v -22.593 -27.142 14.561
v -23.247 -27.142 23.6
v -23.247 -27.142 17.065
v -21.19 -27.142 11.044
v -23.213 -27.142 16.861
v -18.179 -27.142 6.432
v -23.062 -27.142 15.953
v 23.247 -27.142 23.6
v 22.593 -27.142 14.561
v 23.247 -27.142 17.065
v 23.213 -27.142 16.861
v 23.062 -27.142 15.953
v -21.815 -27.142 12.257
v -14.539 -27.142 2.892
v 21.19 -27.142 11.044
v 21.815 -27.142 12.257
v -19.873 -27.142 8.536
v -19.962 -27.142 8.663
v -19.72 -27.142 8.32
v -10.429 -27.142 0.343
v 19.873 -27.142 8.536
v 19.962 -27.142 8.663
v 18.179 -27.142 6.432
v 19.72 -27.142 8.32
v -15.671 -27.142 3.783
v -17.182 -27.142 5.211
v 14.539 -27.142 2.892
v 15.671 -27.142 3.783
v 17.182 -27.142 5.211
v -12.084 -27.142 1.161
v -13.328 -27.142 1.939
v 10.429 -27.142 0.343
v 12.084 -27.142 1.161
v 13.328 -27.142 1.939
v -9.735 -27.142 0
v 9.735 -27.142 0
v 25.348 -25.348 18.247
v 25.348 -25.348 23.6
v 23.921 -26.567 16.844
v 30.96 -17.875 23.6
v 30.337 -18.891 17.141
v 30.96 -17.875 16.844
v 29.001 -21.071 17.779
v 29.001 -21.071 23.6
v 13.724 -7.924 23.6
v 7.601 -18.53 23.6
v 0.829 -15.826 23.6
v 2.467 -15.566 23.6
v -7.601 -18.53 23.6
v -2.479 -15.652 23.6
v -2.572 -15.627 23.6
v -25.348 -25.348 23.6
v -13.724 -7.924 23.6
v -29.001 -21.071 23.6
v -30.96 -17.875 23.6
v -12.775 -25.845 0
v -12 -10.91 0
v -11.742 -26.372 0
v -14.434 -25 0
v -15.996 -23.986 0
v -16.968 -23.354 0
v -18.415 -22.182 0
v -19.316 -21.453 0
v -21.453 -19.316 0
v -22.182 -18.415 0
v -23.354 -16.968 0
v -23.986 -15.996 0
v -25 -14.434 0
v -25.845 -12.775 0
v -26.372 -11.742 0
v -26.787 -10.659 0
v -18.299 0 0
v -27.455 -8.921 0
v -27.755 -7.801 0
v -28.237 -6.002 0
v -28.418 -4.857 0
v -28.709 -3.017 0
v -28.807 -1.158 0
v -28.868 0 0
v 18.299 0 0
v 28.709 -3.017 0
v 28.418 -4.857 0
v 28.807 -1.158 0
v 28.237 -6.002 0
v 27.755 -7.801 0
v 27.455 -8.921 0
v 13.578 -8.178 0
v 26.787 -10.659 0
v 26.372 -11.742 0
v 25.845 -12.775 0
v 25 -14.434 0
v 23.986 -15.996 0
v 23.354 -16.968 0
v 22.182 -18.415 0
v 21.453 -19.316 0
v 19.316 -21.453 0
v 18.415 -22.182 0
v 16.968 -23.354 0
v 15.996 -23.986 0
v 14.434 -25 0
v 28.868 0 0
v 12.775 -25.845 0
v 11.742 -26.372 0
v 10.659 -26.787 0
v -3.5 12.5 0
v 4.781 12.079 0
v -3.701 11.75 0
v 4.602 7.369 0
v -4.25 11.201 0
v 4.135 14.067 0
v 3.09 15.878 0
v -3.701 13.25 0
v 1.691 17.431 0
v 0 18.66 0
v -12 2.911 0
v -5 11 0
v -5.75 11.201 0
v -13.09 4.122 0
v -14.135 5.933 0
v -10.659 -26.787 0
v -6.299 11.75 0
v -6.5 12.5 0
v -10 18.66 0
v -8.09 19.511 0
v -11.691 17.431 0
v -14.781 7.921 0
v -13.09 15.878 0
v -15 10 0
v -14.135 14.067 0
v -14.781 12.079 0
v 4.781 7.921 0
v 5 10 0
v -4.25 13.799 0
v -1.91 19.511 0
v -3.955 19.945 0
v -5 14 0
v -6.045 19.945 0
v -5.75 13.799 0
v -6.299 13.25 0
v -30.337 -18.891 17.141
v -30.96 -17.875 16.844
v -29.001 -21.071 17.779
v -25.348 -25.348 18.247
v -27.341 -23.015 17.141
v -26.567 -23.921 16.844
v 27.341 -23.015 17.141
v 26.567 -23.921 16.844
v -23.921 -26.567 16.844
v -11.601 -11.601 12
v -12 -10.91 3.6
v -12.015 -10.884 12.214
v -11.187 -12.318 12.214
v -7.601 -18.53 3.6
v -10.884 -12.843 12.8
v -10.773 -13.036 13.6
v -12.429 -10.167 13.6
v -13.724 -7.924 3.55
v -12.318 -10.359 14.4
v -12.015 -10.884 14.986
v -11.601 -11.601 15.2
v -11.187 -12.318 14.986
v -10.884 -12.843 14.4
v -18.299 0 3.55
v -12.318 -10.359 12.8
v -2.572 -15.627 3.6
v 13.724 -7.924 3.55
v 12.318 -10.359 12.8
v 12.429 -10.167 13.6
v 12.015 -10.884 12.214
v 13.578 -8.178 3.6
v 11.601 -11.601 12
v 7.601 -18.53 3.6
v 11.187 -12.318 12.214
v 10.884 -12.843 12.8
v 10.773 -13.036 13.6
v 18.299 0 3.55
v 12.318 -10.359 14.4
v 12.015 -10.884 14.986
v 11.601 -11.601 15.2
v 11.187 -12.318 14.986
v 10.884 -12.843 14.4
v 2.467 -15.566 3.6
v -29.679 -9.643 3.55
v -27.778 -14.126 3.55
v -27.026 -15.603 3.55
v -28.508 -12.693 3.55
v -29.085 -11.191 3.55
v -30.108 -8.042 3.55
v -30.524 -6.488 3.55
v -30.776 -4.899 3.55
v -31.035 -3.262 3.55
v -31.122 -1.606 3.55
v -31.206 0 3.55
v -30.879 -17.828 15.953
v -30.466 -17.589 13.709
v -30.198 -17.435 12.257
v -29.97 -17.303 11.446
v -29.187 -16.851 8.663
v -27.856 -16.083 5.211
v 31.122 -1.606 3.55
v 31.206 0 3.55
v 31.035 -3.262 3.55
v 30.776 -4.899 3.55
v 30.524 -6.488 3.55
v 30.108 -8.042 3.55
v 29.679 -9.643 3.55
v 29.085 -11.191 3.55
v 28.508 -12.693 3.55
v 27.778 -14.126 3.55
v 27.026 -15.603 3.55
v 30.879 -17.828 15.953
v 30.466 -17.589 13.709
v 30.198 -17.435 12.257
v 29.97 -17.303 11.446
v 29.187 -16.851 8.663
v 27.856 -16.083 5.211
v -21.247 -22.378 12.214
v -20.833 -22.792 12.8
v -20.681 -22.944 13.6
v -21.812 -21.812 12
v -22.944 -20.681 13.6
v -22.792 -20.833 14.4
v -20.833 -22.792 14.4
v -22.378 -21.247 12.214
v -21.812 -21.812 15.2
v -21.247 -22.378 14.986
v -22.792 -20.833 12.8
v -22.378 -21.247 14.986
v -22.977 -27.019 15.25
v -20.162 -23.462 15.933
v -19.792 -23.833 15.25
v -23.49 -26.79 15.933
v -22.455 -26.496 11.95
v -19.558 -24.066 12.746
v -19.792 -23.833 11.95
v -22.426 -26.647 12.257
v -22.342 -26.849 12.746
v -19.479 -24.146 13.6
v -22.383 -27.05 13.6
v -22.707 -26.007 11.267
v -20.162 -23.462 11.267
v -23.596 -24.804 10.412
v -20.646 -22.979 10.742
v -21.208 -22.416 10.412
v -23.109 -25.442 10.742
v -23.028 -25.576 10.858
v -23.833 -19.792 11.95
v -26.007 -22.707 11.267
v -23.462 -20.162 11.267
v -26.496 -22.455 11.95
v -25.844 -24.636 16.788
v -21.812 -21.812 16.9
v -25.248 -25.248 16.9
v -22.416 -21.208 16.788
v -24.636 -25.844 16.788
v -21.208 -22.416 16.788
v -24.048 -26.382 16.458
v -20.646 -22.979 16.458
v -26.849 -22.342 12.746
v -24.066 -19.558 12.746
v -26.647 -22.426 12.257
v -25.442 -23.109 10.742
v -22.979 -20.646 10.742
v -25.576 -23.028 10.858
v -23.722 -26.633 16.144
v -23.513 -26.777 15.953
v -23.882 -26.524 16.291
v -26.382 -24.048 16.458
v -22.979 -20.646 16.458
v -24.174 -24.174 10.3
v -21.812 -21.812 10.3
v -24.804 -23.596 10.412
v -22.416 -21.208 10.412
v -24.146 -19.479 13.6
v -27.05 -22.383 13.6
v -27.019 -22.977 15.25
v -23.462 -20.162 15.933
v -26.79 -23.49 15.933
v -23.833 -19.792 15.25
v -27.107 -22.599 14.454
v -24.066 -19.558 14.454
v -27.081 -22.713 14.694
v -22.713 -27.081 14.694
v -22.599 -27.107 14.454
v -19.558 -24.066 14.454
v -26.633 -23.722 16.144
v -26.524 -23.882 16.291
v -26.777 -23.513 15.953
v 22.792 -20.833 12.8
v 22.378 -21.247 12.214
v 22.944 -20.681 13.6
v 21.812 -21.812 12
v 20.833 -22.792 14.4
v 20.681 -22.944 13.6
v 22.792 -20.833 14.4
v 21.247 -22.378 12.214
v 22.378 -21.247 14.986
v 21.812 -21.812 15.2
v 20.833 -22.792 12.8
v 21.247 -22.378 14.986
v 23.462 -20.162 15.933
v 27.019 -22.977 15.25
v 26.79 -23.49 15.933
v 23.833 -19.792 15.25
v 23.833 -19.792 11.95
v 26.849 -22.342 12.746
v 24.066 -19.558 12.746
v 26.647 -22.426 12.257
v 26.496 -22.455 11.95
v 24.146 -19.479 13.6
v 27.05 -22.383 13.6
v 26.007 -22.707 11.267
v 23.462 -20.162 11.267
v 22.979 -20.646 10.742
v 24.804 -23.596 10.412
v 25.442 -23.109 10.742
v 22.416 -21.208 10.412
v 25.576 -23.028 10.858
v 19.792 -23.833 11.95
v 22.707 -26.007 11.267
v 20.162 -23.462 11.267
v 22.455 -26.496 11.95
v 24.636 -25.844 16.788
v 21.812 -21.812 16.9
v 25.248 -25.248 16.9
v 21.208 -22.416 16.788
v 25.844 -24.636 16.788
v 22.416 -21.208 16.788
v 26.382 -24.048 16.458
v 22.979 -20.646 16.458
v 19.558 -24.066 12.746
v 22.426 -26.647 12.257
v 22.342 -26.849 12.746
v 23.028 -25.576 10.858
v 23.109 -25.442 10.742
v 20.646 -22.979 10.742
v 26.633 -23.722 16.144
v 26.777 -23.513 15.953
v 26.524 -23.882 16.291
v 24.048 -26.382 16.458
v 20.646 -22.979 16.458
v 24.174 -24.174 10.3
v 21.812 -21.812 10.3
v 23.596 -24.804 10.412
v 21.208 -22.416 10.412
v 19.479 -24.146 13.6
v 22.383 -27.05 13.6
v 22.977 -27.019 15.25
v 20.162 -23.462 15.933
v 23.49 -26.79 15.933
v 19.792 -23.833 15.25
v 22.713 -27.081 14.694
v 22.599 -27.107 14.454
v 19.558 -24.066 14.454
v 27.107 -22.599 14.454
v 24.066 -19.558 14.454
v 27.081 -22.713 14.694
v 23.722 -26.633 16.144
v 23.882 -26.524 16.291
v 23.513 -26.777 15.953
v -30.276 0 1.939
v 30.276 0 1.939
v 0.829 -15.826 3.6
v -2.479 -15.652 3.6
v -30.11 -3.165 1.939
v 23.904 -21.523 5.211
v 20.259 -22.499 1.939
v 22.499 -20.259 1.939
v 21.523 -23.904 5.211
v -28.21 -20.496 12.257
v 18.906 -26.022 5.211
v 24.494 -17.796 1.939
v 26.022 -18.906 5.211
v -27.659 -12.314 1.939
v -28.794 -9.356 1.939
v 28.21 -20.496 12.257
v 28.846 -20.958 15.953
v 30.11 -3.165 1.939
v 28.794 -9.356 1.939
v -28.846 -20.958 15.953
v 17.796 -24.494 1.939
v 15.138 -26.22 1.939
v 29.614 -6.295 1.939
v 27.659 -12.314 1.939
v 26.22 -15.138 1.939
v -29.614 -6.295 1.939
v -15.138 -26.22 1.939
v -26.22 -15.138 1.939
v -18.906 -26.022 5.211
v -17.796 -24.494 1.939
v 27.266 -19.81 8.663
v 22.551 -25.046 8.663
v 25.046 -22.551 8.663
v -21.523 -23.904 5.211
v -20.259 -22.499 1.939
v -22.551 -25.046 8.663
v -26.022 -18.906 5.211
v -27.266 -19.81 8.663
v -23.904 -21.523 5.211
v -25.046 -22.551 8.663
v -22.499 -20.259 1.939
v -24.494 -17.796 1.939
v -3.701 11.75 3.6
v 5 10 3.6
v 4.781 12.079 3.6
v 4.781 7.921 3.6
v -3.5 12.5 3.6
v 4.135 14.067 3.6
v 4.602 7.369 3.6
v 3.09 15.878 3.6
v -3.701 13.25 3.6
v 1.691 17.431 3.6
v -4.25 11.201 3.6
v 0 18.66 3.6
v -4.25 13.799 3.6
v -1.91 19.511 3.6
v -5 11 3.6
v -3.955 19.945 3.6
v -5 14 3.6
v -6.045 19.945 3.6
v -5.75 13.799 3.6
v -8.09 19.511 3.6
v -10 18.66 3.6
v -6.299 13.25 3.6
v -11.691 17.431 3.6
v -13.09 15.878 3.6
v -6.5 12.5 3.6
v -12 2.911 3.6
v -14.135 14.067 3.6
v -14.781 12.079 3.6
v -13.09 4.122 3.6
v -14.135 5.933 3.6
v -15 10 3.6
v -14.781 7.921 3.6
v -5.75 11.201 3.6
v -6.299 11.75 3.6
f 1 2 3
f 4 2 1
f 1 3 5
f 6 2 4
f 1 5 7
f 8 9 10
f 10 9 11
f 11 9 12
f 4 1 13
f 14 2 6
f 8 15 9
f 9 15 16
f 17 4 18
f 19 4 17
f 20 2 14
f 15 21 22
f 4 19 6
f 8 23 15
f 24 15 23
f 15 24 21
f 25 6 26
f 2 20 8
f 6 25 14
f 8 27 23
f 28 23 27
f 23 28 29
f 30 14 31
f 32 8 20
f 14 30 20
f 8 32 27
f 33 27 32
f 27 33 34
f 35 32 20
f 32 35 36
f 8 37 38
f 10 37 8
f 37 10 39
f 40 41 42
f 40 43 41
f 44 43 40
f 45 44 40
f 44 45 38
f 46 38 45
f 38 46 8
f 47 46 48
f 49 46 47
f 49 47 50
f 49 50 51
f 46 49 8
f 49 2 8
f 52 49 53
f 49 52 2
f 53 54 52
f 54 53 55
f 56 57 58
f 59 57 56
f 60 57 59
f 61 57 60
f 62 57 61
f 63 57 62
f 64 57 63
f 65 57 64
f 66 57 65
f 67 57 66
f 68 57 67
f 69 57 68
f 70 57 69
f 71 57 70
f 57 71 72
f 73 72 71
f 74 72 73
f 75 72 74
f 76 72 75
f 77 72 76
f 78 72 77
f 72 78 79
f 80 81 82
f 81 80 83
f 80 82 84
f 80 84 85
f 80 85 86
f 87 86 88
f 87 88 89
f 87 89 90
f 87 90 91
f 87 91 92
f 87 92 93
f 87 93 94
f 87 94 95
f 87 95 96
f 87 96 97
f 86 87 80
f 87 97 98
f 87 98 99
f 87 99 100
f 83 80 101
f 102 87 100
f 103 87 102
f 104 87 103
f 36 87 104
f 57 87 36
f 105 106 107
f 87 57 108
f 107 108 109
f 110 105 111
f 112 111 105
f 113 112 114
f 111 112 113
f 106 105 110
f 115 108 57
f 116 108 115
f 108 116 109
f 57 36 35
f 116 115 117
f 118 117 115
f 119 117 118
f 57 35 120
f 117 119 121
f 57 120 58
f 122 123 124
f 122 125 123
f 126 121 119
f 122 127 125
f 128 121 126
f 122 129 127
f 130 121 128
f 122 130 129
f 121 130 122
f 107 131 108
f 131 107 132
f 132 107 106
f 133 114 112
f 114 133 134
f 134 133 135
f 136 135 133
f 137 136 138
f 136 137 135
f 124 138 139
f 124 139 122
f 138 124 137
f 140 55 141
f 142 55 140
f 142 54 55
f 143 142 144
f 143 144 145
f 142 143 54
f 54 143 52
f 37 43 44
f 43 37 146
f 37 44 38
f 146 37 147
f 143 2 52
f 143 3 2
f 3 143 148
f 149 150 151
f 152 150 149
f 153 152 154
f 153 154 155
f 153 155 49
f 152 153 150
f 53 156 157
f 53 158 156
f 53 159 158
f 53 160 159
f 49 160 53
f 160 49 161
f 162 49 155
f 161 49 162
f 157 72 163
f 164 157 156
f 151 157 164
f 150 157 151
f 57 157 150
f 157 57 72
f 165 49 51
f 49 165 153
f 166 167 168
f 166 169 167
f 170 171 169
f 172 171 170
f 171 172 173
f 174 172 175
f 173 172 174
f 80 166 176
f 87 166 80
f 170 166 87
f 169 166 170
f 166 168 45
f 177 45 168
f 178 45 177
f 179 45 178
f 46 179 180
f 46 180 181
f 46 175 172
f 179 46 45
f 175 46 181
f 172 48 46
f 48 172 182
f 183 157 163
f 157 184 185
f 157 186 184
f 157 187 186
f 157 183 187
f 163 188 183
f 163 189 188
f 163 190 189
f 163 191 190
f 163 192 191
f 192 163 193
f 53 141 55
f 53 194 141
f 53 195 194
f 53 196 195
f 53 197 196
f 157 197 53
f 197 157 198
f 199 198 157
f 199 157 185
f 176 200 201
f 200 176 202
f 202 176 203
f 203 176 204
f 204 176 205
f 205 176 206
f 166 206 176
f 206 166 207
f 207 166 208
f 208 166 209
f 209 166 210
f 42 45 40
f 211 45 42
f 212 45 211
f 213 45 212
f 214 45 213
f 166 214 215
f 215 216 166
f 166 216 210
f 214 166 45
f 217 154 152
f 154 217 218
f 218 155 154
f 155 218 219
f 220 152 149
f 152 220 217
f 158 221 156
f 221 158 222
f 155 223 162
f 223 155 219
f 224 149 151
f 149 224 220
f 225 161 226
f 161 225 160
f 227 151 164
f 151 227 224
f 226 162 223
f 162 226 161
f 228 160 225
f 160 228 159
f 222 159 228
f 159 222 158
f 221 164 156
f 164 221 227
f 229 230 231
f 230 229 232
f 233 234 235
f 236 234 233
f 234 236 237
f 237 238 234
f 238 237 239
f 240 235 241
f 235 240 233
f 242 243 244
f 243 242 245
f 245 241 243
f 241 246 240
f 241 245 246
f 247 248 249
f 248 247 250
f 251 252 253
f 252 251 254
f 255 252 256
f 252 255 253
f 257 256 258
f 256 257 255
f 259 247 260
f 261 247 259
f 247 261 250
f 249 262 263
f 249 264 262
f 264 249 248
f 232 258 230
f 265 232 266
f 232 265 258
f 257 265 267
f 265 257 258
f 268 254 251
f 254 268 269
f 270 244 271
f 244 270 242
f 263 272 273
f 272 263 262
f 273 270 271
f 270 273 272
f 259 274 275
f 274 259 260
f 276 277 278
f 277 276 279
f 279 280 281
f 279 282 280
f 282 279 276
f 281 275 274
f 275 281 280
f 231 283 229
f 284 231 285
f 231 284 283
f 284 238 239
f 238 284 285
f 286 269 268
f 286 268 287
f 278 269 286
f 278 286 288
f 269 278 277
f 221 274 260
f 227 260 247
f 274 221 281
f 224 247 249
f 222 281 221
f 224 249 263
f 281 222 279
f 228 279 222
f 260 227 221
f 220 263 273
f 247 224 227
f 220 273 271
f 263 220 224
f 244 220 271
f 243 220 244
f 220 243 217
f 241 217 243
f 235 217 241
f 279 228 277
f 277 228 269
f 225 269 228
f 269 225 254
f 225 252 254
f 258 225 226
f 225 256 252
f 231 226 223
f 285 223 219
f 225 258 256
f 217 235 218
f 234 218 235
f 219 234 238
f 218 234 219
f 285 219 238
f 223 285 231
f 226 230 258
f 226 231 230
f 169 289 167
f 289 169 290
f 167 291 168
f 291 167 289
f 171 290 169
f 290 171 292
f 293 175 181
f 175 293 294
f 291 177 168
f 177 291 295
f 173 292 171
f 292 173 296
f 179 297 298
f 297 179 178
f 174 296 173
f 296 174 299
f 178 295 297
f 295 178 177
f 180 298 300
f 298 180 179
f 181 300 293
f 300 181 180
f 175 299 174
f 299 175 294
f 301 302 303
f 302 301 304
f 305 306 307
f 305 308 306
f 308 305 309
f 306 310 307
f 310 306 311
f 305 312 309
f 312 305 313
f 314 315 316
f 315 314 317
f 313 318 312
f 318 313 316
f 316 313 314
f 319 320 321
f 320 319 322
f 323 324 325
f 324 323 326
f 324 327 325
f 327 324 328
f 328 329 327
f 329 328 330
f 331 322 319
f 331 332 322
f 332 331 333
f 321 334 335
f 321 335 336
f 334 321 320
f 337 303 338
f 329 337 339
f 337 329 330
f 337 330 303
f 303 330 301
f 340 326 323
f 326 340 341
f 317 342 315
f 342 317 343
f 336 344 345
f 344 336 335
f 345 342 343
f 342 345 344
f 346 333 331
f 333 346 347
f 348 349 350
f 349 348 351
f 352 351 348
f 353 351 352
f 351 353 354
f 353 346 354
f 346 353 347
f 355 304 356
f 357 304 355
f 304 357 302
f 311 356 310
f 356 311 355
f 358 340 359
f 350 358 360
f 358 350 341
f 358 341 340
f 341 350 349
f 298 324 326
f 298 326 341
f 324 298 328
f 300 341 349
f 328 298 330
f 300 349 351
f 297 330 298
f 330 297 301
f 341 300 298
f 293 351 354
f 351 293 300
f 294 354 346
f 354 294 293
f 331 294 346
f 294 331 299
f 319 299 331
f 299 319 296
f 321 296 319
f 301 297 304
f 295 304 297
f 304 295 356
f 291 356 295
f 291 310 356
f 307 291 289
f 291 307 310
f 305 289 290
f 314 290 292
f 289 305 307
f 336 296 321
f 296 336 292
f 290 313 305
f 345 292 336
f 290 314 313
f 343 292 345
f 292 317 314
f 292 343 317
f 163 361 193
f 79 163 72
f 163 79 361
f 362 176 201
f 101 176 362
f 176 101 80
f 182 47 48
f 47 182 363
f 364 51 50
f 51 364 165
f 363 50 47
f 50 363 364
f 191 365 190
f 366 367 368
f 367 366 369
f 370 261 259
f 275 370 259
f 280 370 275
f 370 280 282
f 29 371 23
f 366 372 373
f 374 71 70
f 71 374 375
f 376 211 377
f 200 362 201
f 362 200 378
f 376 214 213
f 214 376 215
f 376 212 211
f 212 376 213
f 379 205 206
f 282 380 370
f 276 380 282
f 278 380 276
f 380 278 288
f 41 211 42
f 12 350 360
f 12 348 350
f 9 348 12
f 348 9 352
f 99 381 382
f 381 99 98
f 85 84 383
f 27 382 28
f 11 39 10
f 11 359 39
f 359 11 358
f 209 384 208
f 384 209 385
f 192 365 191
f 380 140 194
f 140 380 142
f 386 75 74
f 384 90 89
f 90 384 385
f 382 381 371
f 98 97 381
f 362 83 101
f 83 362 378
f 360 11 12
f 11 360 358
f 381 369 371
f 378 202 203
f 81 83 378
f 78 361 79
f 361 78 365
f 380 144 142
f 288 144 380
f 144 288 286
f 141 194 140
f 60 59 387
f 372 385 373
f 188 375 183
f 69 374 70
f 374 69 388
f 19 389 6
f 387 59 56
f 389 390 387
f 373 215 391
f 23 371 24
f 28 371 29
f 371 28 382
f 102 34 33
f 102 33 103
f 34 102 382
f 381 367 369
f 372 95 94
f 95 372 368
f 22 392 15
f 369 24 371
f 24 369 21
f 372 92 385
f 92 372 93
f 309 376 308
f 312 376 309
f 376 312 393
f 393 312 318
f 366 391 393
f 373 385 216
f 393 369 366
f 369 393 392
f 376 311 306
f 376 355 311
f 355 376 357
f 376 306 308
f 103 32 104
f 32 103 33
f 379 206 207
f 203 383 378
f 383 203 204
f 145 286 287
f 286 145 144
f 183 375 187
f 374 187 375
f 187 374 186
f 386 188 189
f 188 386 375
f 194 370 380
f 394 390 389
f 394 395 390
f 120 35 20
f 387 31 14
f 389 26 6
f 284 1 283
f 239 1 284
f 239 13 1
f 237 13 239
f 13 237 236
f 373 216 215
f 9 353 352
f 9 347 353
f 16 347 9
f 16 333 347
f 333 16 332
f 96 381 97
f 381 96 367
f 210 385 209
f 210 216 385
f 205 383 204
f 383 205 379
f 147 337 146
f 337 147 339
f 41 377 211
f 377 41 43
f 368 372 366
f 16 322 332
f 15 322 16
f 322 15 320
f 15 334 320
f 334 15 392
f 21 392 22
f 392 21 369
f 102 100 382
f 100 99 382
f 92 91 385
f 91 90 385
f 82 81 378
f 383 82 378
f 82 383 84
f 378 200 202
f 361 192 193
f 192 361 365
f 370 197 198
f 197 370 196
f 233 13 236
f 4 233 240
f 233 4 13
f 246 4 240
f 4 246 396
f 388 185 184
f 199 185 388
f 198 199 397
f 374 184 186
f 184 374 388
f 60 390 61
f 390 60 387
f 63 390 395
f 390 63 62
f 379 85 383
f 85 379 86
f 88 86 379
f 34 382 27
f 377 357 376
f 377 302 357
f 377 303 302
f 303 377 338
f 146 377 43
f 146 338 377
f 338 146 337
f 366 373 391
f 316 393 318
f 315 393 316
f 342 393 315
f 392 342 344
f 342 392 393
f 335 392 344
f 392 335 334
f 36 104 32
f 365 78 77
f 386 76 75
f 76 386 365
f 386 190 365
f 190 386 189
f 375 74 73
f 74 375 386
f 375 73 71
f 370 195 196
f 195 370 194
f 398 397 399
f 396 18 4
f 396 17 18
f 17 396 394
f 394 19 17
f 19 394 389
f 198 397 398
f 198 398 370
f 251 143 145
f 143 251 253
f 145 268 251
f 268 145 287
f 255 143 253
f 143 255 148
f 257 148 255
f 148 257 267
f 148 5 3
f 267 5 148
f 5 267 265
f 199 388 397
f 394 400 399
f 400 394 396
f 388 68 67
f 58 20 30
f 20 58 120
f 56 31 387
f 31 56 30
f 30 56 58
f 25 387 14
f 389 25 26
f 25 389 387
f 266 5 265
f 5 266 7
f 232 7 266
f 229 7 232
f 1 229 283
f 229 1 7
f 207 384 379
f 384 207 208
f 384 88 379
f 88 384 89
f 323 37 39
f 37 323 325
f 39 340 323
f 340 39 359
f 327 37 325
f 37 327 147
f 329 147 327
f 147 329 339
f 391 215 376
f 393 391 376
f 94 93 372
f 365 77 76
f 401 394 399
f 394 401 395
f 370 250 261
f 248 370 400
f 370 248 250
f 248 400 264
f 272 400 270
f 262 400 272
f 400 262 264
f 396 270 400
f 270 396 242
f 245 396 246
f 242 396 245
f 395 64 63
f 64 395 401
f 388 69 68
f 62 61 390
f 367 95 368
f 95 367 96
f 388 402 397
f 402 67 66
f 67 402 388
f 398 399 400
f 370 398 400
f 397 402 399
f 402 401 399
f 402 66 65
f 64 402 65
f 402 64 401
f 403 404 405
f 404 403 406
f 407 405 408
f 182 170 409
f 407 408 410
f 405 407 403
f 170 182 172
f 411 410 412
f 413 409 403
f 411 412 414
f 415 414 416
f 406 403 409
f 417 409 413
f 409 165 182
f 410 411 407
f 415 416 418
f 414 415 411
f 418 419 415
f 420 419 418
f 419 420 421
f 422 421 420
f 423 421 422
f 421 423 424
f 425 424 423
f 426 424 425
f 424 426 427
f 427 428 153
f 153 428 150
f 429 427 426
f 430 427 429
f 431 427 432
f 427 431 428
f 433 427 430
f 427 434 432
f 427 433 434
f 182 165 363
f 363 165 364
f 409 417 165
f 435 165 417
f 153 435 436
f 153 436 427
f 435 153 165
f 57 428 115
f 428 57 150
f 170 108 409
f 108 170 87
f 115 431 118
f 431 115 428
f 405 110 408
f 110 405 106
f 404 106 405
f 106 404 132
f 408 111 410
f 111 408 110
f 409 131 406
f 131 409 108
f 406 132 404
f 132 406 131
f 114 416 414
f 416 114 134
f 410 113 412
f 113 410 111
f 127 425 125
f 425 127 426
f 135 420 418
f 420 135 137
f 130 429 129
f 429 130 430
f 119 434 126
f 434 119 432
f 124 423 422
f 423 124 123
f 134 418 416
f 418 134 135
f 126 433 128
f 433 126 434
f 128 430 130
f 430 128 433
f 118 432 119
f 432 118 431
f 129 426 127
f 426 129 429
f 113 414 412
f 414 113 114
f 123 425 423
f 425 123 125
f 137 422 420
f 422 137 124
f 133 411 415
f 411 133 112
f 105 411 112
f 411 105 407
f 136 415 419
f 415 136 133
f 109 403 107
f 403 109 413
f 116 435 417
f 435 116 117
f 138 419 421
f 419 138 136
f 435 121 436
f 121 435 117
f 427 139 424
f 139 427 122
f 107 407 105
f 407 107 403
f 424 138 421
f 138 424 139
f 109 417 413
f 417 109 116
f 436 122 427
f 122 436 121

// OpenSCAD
// file: libraries/frame_axis_block.scad
// extr=20; h = 3*extr; w = h; diagonal = extr*sqrt(2); thickness=3.6; 
 

module frame_axis_block(h, w, thickness, extr, diagonal) {
  difference() {
    intersection() {
      //rotate([0, 0, -30])
       translate([-extr*sin(15), -extr*cos(15), -h/2], center=false)
	        cube([extr*sin(15)+thickness, w, h]);
      union() {
	      translate([0,-extr*cos(15), -h/2]) 
      //   rotate([0, 0, -30])
	          cube([thickness, w, h]); //main frame plate
	    //  rotate([0, 0, -45])
        translate([-extr*sin(15), -extr*cos(15), -h/2])
          rotate([0,0,-15])
	          cube([extr, extr, h], center=false); //15degr extr cutout
      }
    } 
    
    
      // Vertical OpenBeam mounting screw holes.
       # for (z=[h/2-extr/2, -h/2+extr/2]) {
          translate([0, 0, z]) 
            rotate([90, 0, 75])
              translate([-extr/2, 0, extr/2*sin(15)+5]) {
                 cylinder(r=1.6, h=50, $fn=12, center=true);
                // cylinder(r=2.8, h=3, $fn=12, center=true);
        }
      }
    // Horizontal OpenBeam mounting screw holes.
       for (z= [h/2-extr/2, -h/2+extr/2]){
       for (y = [extr/2, w-extr*cos(15)-extr/2]) {
           translate([0, y, z])
             rotate([0, 90, 0])
               cylinder(r=1.6, h=10, $fn=12, center=true);
       }
      }  
    
}
}
//
// scale([1, 1, 1]) rotate([0, 90, 90]) rotate([0, 0, 30]) 
//{ frame_axis_block(h, w, thickness, extr, diagonal);
//    translate([-extr*sin(15), -extr*cos(15), -h]) rotate([0, 0, 75]) % cube([extr, extr, 1000], center=false);
//   }
// file: tensioner_608.scad
include <configuration.scad>;

offset_x = -12;
offset_y = 12;
rotate_z = -22.5;

module tensioner_608() {
  difference() {
    union() {
      difference() {
        union() {
	  rotate([0, 0, rotate_z]) translate([offset_x, offset_y, -4]) {
	    cube([14, 14, 22], center=true);
	    translate([7, 0, 0]) cylinder(r=7, h=22, center=true, $fn=32);
	    translate([0, -7, 0]) cylinder(r=7, h=22, center=true, $fn=32);
	  }
          translate([0, 3, -4]) cube([14, 20, 22], center=true);
          translate([0, -7, -12.5]) cylinder(r=7, h=5, center=true, $fn=24);
        }
        translate([0, -11, 11]) cube([18, 22, 22], center=true);
        rotate([0, 90, 0]) cylinder(r=12, h=8, center=true, $fn=60);
      }
      rotate([0, 90, 0]) cylinder(r=7, h=14, center=true, $fn=24);
    }
    rotate([0, 90, 0]) {
      cylinder(r=11, h=6.8, center=true);
      cylinder(r=4, h=18, center=true, $fn=24);
    }
    for (y = [10, -12]) {
      translate([0, y, -7]) cube([1, 6, 20], center=true);
      translate([0, y, -16]) rotate([0, 45, 0]) cube([3, 6, 3], center=true);
    }
    rotate([0, 0, rotate_z]) translate([offset_x, offset_y, -4]) {
      // OpenBeam groove slider.
      translate([-1, 1, 0]) cube([extr_corn+clear, extr_corn+clear, 23], center=true);
      translate([-6, 6, 0]) cube([9, 9, 23], center=true);
      // Vertical M3 screw for tension.
      translate([0, -7, -8]) scale([1, 1, -1]) {
	cylinder(r=m3_open_radius, h=50, center=true, $fn=12);
	cylinder(r=m3_nut_radius, h=5, $fn=6);
	cylinder(r1=m3_nut_radius-2, r2=m3_nut_radius+2, h=5, $fn=6);
      }
    }
  }
}

translate([0, 0, 15]) {
  tensioner_608();
  % rotate([0, 90, 0]) cylinder(r=11, h=7, center=true);
}
// file: corner.scad
include <configuration.scad>;
use<libraries/frame_axis_block.scad>;
//extr=15;
radius = thickness+cos(30)*diagonal/2+extr;
bracket = 10;

module corner(h) {
  difference() {
    intersection () {
      translate([0, extr/4, (h-extr)/2]) rotate([90,0,0])
       cube(diagonal+extr*1.8, center=true);
      translate([0, 0, (h-extr)/2])
       cylinder(h=h, r=radius, center=true, $fn=40);
     }
  // Remove back half of cylinder.
    translate([0, radius, 0])
      cube([2*radius, 2*radius, 2*h], center=true);
  // Center round.
    
    rotate([0, 0, 45])
      cylinder(r=radius-extr, h=2*h, center=true);
  // Horizontal OpenBeam frame pieces.
  for(i=[-1,1]) {
    #rotate([0, 0, -30*i]) translate([(radius-extr/2)*i, 30, 0])
      cube([extr+0.1, 60, extr+0.1], center=true);
    
  // Frame brackets under the corner.
  #  
  translate([diagonal/2*i, 0, 0])
   rotate([0, 0, -30*i]) 
    scale([i,1,1]) frame_axis_block(extr*3,30,thickness,extr,diagonal);
    }

    // Screw holes.
    for (a = [-45, 45]) {
      rotate([0, 0, a]) rotate([90, 0, 0]) {
	      cylinder(r=1.6, h=4*extr, center=true, $fn=12);
	    translate([0, 0, radius])
	      cylinder(r=3.3, h=extr/2, center=true, $fn=24);
      }
    }
  }
}

translate([0, 0, extr/2]) {
  corner(extr);
  % rotate([0, 0, 45]) cube([extr, extr, extr], center=true);
}
// file: configuration.scad
// OD = outside diameter, corner to corner.
m3_nut_od = 6.1;
m3_nut_radius = (m3_nut_od+0.2)/2;

// Major diameter of metric 3mm thread.
m3_major = 2.85;
m3_radius = m3_major/2;
m3_open_radius = 3.2/2;
m3_cap=4;
m3_clr=0.2;

// NEMA17 stepper motors.
motor_d=48;
motor_shaft_diameter = 5;
motor_shaft_radius = (motor_shaft_diameter+0.3)/2;

//frame motor dimm
motor_screws = 31; // mm center-to-center
motor_width = 42.5; // mm total motor face width
motor_height = 15; // mm bracket height
motor_length = 12; // mm bracket length
motor_screws_height = (motor_width - motor_screws) / 2;
motor_shaft = 30; // mm from motor face to OpenBeam center
motor_thickness = 5; // mm bracket thickness
//height = 2*extr + motor_width;
//diagonal = extr*sqrt(2);
motor_offset = motor_shaft+2;

// Frame brackets.
thickness = 3.6;

// extrusion dimmensions
extr = 20; //15 - 20 for 20x20 extrusion
extr_tslot = 6.8; //3.2 6.8 for 20x20 extrusion
extr_nut = 11; //5.8 11 for 20x20 extrusion
extr_corn = (extr - extr_tslot)/2;
diagonal=extr*sqrt(2);

clear = 0.4;

// motor offset change 24mm - pulley size +2mm offset
//if (motor_shaft < 24) {
  //motor_offset = 24 ;
  //}
  //else  {motor_offset = 24;
  //}

//dimmensions calculations for frame_motor (some trigonometry)

f1= (extr*sin(15)+thickness)/cos(30);
f2=(extr*sin(15)+thickness)*cos(60)/sin(60);
L=f1+diagonal+motor_offset;
f4=L*sin(30)/cos(30)-motor_d/2;
f3=f4/2;
w_fm = L/cos(30)-f3-f2;

//motor cut_off frame
h_mot_cut_off = L*sin(30) - (motor_screws - motor_d/2)*cos(30);
// main file
include <configuration.scad>;
use <corner.scad>;

module frame_top() {
  difference() {
    union() {
      intersection() {
	     corner(extr+thickness);
	     translate([0, 0, -8]) sphere(r=(extr*1.8+0.1), $fn=60);
       }
      translate([-5, 10, extr/2]) {
	cylinder(r=extr/2, h=thickness);
	for (a = [0, 30]) {
	  rotate([0, 0, a]) translate([0, -extr, thickness/2])
	      cube([14, 30, thickness], center=true);
	}
      }
    }
    translate([-5, 12.5, 0]) # cylinder(r=1.5, h=extr+thickness, $fn=12);
  }
}

translate([0, 0, extr/2+thickness]) {
  scale([1, 1, -1]) frame_top();
  % rotate([0, 0, 45]) cube([extr, extr, extr], center=true);
}

use <tensioner_608.scad>;
% translate([-1.5, 22, 10]) rotate([180, 0, 45]) tensioner_608();
